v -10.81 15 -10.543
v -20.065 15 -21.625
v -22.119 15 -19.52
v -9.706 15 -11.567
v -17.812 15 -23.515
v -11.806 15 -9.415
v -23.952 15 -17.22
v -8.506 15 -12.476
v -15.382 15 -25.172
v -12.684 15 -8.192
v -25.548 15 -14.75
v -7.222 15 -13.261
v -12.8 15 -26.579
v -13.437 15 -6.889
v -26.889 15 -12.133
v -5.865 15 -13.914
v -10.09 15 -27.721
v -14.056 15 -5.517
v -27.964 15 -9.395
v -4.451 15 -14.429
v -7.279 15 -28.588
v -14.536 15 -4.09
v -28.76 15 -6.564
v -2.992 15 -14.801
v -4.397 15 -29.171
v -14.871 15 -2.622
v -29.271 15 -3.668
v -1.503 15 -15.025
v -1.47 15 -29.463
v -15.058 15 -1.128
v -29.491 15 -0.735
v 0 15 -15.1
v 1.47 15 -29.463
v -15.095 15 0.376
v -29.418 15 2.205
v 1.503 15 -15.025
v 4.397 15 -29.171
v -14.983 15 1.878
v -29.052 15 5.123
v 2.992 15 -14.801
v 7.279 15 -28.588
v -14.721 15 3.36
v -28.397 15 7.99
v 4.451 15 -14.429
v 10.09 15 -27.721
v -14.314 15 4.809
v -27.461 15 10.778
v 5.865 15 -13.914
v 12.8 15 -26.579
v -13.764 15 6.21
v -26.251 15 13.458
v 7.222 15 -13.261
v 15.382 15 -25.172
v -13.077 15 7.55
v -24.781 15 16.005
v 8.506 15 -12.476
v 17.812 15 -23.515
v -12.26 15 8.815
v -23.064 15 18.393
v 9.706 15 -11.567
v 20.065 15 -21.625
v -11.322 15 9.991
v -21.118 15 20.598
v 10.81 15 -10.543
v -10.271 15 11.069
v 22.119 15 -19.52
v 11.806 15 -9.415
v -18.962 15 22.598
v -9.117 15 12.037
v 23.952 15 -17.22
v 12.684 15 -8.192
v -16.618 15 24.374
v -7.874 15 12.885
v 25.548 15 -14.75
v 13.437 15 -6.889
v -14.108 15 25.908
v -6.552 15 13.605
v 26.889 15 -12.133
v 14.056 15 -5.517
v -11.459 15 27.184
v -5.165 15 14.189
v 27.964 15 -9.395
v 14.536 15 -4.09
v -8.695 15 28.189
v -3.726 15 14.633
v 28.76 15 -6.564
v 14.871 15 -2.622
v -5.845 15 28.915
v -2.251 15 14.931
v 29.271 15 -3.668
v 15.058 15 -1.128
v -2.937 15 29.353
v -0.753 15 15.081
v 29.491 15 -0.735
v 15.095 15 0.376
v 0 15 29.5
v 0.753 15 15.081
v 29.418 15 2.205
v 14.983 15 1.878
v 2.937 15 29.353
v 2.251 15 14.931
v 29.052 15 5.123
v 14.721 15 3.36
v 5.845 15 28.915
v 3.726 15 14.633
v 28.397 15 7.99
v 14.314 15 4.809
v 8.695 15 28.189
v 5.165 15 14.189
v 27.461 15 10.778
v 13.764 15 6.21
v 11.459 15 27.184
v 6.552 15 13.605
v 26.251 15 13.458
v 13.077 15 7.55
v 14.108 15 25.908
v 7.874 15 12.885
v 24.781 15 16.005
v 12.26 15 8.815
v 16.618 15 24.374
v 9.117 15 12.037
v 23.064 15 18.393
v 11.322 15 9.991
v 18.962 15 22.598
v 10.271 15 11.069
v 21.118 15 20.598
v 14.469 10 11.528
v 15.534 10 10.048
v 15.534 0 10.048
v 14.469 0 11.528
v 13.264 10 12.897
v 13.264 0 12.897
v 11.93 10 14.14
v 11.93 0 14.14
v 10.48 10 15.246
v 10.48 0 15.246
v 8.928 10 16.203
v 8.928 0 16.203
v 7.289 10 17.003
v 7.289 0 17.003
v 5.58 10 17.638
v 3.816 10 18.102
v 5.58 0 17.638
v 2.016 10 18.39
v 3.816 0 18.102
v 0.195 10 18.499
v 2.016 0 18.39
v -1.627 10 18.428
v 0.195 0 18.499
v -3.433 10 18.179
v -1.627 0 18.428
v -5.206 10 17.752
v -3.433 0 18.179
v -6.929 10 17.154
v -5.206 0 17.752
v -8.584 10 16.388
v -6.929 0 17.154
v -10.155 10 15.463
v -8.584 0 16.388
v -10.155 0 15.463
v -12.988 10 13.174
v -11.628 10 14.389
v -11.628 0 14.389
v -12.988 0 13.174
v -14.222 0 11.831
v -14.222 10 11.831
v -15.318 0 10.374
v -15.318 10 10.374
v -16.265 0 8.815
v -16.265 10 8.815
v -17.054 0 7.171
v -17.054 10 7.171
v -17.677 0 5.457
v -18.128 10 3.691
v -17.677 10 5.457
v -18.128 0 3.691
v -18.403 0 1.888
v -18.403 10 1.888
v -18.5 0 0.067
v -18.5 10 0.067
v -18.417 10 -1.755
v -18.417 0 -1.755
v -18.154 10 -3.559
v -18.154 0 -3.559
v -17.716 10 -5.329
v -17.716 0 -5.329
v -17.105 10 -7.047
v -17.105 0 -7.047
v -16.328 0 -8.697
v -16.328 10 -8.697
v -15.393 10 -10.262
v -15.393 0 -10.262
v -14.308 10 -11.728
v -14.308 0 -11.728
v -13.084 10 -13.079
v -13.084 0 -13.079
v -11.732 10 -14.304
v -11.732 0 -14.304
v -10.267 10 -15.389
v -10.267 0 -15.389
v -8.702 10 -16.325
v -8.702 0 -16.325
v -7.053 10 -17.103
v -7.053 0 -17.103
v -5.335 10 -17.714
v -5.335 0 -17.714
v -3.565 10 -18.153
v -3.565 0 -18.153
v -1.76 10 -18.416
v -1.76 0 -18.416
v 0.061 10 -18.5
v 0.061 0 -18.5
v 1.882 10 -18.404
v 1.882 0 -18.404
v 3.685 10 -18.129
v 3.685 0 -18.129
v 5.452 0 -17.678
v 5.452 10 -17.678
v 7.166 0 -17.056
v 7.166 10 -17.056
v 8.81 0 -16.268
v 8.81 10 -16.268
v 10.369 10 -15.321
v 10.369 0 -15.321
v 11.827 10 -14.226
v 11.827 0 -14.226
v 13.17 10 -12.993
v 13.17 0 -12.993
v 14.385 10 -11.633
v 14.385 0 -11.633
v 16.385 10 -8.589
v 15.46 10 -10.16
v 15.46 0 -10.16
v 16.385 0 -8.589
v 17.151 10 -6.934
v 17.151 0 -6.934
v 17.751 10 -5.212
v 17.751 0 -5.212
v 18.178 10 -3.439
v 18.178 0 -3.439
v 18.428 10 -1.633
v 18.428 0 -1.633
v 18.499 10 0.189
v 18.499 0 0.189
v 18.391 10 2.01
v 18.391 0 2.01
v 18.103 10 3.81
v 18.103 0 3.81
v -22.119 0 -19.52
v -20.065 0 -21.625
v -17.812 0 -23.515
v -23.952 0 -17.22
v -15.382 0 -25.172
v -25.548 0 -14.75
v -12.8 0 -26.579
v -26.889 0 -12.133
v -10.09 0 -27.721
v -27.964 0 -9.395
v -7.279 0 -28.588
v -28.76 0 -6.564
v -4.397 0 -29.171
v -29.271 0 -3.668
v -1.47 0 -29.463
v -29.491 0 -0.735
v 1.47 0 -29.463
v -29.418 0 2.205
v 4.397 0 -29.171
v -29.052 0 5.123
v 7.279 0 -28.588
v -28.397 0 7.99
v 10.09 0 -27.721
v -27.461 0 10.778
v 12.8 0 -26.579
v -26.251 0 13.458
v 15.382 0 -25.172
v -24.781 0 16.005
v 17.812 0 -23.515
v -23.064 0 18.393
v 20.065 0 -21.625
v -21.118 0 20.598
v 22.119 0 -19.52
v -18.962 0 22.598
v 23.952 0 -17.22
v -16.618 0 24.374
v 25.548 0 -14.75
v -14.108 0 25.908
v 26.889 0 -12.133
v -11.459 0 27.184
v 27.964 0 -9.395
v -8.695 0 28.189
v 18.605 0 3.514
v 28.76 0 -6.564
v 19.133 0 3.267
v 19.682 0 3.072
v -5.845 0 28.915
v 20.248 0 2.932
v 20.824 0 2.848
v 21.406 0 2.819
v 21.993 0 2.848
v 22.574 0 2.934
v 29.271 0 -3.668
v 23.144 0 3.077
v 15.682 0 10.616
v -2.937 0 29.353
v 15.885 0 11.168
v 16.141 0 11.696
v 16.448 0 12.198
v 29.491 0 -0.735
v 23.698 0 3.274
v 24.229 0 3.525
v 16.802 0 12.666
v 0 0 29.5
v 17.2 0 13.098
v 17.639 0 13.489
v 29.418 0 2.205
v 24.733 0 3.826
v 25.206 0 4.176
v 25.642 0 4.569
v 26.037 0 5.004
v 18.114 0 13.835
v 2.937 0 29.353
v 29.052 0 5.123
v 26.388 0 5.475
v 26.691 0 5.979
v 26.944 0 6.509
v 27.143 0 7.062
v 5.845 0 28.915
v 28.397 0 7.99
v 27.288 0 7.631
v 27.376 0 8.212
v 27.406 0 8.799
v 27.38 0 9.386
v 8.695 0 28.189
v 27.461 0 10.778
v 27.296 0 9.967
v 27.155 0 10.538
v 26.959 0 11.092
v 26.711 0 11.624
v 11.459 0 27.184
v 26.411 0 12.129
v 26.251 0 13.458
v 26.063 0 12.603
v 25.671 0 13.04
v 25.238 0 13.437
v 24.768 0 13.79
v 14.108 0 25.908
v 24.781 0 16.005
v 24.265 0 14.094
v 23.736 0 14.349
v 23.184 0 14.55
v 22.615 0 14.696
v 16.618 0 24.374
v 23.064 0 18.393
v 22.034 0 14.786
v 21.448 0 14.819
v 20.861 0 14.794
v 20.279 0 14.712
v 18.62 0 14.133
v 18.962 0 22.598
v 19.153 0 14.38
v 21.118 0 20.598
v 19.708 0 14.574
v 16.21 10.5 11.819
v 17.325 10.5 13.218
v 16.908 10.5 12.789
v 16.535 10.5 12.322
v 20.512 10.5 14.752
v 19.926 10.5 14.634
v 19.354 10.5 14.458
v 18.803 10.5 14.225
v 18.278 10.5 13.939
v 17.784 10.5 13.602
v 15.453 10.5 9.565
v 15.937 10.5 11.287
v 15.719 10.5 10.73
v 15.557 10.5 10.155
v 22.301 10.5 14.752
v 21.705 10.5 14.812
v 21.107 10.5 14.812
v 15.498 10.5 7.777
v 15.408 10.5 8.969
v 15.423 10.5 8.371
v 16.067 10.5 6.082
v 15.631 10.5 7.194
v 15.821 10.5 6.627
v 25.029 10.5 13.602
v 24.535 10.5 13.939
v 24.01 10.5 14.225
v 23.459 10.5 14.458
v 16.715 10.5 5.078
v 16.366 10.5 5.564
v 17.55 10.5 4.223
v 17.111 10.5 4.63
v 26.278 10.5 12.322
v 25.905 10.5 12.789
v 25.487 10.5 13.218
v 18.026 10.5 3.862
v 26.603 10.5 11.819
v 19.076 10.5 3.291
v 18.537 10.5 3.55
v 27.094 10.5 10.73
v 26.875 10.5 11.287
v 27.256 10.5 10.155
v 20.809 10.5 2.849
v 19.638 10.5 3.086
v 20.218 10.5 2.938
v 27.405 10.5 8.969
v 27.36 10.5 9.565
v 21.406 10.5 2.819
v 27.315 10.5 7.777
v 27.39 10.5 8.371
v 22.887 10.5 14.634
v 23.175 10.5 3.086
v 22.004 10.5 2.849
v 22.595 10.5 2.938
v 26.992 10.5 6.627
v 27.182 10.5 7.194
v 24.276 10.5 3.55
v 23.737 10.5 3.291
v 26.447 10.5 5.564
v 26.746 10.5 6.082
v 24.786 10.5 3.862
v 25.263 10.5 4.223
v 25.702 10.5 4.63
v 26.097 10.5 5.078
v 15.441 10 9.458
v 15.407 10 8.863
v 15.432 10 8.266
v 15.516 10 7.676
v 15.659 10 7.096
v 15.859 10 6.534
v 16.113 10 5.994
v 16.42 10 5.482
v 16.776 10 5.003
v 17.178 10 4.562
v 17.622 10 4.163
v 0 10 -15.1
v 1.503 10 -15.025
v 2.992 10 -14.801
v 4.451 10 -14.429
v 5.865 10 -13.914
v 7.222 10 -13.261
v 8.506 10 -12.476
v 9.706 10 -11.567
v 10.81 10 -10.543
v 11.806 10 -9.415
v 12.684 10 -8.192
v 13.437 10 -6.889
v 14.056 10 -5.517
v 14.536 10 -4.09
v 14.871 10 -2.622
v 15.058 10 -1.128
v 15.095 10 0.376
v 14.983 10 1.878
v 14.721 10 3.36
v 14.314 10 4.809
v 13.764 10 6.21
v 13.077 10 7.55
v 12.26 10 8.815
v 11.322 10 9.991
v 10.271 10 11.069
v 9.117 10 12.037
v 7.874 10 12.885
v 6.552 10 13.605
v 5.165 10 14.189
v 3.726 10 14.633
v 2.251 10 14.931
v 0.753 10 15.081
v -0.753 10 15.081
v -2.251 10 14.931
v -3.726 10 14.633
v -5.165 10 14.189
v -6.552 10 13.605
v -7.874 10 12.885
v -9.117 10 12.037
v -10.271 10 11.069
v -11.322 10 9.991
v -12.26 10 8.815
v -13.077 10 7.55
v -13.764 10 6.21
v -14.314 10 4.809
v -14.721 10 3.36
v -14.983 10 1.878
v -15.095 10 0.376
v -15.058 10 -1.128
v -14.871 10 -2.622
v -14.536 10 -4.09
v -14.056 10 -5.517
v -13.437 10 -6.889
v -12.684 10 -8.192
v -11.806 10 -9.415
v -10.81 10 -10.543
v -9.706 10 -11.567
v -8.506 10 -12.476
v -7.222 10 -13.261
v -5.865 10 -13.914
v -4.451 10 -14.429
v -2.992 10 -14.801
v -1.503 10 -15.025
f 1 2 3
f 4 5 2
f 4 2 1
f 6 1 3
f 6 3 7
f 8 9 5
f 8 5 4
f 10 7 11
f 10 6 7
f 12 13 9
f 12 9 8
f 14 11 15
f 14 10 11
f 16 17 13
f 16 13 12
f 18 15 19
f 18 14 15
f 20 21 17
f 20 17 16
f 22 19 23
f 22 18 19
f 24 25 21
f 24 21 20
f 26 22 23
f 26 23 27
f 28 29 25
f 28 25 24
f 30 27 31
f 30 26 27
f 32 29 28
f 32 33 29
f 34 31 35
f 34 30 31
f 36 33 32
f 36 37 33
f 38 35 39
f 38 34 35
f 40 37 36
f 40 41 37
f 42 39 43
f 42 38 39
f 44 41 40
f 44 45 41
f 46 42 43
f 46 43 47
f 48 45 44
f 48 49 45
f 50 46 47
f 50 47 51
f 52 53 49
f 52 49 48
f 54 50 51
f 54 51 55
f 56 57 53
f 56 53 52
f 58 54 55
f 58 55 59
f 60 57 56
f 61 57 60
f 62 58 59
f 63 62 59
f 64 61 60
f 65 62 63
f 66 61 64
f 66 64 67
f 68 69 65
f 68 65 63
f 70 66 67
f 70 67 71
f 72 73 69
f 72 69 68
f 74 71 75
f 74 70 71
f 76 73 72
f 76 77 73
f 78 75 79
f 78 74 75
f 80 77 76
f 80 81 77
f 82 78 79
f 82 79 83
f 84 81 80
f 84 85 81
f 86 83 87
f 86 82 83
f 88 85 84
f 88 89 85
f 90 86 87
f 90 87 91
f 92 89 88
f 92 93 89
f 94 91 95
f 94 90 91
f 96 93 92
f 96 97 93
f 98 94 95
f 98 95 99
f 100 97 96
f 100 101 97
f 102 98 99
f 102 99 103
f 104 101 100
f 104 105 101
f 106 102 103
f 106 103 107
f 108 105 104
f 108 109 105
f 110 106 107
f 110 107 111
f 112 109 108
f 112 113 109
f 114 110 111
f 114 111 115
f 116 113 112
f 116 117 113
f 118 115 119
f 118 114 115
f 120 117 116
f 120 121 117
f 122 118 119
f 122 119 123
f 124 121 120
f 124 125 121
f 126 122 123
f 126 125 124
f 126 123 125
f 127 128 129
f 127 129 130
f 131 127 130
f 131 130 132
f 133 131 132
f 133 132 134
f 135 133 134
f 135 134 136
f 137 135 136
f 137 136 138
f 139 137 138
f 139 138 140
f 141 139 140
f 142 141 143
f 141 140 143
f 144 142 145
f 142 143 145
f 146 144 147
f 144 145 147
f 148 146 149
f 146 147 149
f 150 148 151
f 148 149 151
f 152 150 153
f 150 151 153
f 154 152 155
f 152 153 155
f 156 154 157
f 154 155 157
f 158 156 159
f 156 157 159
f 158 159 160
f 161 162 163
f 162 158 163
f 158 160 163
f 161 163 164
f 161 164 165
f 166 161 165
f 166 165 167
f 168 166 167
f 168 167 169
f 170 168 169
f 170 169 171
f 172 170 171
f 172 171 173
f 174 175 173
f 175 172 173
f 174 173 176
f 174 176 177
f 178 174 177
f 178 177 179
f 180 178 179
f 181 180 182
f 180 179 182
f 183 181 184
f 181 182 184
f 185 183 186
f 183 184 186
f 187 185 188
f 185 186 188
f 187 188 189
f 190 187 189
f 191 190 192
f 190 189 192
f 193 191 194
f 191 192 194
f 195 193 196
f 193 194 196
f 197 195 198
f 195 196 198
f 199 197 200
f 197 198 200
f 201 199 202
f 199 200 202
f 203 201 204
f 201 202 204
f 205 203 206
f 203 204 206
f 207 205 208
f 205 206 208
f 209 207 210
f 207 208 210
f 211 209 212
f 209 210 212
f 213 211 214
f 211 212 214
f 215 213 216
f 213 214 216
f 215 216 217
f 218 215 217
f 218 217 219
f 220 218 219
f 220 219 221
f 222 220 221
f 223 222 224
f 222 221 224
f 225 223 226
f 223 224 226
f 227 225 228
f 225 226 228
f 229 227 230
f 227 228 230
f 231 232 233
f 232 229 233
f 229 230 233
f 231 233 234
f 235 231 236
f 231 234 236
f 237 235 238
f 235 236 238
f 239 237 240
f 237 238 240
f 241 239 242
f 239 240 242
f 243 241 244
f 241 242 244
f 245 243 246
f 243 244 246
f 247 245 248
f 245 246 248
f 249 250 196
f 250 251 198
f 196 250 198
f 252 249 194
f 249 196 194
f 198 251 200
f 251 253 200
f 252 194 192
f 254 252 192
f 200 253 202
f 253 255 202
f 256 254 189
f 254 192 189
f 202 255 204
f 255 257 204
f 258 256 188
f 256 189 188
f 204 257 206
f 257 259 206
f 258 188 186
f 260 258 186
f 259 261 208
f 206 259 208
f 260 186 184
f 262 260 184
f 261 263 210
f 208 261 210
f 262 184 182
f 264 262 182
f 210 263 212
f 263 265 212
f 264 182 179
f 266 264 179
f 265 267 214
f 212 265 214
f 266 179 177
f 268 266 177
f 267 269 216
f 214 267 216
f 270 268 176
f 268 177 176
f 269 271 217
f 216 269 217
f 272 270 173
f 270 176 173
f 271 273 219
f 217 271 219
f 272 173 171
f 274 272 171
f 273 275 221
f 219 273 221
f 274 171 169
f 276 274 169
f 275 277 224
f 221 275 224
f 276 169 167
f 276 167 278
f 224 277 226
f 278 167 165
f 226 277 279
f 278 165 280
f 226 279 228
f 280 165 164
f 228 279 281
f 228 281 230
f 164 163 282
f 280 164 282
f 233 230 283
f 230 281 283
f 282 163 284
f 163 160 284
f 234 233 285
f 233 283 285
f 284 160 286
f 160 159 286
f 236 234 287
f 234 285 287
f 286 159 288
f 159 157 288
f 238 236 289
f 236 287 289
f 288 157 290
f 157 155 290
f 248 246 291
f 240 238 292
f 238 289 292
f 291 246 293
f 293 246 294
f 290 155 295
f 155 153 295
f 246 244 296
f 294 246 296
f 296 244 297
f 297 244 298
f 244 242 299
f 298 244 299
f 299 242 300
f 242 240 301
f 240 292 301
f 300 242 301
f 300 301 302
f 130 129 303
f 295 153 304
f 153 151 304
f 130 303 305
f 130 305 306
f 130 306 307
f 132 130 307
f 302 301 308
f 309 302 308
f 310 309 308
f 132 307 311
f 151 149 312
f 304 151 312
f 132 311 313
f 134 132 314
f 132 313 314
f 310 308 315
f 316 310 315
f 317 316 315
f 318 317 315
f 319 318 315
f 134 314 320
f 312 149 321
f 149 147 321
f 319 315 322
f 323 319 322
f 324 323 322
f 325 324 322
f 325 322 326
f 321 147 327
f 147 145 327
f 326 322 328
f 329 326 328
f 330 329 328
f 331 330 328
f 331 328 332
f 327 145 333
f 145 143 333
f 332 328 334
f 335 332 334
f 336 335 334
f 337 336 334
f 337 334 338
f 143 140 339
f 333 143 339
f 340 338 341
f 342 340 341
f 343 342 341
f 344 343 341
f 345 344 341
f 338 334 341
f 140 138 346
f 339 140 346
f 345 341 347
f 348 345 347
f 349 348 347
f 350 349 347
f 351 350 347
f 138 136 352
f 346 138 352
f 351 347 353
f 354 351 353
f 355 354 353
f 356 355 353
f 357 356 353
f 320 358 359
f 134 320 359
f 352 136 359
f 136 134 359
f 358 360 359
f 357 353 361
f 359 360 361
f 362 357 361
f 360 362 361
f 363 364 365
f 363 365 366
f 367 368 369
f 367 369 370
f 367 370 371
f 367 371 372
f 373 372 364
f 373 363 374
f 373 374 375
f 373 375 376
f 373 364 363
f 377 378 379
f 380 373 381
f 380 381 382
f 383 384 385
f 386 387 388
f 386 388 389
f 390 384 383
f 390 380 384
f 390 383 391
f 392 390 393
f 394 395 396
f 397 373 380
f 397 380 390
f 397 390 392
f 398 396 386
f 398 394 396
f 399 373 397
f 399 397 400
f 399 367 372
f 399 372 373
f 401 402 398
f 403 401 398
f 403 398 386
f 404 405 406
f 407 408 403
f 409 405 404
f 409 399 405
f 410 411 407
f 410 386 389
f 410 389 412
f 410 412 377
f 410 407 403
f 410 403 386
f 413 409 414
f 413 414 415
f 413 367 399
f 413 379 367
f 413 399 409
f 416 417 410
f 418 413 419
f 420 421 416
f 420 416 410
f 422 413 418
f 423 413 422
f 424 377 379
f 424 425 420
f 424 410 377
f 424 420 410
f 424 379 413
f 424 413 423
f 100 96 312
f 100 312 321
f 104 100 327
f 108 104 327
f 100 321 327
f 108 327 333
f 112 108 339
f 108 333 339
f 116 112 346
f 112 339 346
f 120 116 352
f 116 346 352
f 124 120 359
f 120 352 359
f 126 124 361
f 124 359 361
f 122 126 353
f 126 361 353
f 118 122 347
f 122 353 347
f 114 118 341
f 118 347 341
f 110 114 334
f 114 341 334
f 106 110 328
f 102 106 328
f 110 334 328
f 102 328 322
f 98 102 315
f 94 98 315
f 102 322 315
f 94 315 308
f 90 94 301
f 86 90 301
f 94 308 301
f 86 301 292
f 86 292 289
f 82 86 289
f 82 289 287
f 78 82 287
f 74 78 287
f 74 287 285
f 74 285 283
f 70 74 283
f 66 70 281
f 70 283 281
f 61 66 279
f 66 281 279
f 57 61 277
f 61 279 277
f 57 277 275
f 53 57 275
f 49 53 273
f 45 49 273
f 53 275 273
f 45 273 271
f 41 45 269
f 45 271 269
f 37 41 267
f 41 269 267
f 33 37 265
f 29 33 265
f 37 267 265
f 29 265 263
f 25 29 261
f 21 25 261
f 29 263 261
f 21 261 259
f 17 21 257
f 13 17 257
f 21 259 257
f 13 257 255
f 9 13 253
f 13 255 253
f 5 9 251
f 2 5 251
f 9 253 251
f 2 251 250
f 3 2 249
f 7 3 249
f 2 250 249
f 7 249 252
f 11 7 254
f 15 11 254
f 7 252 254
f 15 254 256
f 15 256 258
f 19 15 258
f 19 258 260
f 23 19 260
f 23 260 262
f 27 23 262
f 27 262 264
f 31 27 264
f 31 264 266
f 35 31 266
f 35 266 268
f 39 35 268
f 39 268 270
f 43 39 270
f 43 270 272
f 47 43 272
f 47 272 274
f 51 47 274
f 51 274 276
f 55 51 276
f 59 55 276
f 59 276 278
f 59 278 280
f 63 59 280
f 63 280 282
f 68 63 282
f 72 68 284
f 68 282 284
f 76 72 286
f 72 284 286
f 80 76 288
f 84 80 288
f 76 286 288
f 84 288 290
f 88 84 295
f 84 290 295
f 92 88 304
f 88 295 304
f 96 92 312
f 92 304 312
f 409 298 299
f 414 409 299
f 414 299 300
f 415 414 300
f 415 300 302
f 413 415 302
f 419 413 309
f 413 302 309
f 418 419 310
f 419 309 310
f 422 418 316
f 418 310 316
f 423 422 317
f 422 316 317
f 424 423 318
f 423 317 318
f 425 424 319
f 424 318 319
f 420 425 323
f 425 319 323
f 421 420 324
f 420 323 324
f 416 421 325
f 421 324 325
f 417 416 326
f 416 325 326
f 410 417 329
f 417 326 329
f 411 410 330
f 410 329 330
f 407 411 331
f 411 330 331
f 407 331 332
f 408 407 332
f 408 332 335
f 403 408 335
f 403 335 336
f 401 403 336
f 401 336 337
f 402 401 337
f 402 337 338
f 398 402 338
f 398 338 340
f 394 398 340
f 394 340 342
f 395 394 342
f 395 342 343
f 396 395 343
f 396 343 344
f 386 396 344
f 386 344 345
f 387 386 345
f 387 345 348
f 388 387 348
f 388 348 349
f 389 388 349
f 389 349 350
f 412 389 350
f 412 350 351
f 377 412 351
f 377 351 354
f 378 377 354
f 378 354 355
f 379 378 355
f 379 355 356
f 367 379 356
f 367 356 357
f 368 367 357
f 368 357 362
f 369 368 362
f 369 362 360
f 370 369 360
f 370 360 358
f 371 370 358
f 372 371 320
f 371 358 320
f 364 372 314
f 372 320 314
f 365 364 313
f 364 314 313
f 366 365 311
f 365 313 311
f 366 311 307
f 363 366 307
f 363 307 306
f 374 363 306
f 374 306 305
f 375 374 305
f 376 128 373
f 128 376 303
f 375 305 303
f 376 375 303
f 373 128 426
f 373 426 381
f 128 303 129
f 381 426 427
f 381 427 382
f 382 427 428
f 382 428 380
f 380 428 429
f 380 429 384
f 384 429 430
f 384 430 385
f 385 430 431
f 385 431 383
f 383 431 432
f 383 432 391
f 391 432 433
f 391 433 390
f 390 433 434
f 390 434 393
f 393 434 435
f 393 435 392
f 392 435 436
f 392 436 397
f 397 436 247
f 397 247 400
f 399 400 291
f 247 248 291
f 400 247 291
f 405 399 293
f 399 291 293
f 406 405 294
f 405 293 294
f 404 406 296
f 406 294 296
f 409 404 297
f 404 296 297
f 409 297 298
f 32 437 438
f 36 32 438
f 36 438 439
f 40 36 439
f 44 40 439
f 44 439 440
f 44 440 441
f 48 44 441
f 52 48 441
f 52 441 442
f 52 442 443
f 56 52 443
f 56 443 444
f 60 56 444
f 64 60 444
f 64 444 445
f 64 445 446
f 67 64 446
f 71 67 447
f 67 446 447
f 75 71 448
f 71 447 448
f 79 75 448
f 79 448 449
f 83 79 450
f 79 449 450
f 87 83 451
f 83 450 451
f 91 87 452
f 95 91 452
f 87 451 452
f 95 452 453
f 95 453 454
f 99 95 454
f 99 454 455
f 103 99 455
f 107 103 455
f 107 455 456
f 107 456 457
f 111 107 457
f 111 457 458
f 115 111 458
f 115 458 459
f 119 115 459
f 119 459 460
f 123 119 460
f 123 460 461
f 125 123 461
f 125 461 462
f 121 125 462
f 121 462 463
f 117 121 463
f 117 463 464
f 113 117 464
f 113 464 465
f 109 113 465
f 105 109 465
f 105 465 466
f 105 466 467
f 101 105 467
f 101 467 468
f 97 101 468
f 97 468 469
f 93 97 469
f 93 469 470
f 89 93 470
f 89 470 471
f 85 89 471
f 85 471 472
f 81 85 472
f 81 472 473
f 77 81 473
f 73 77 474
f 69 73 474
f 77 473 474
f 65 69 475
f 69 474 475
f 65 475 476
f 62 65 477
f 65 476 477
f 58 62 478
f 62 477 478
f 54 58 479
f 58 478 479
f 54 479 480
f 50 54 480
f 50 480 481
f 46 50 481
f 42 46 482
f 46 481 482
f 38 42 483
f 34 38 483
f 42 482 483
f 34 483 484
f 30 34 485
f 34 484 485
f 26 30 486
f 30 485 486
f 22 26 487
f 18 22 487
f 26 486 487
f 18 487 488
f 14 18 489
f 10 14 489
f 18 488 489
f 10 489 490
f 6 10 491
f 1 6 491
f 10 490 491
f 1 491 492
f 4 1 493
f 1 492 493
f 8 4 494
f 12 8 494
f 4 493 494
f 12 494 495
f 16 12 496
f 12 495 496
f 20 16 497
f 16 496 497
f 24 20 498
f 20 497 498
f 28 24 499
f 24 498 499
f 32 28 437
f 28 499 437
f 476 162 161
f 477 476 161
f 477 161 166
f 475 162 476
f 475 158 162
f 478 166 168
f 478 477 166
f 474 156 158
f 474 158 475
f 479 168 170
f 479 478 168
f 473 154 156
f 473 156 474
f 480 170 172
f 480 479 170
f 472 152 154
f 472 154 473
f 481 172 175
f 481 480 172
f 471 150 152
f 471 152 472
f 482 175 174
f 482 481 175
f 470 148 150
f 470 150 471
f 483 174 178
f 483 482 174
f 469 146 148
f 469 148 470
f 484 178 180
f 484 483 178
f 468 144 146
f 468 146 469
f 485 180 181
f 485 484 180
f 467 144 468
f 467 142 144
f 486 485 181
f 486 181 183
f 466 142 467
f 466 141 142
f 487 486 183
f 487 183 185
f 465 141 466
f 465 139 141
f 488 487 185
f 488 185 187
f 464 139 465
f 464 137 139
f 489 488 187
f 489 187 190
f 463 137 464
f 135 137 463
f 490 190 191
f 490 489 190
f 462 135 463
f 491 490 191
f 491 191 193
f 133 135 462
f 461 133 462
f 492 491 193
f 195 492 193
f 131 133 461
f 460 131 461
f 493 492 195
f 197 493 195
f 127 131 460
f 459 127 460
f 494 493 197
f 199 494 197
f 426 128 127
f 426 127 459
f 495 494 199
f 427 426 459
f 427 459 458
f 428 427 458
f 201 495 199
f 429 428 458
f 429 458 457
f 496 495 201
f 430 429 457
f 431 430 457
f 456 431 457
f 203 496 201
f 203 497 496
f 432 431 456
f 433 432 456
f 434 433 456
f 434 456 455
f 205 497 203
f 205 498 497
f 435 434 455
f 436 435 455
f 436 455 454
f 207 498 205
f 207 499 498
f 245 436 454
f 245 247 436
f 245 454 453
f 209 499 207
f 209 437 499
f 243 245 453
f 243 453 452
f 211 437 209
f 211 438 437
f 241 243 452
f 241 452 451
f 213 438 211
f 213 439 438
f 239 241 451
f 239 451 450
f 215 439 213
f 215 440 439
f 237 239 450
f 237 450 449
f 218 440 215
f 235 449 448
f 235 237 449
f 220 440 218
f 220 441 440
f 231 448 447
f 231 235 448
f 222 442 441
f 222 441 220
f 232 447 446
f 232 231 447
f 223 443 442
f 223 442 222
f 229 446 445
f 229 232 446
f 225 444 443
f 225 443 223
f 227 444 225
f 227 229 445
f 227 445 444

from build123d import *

# Parameters (mm, degrees)
SKETCH1_R           = 29.5
BOSS_EXTRUDE1_DEPTH = 15
SKETCH2_R           = 15.1
CUT_EXTRUDE1_DEPTH  = 45.333959895
SKETCH3_R           = 18.5
CUT_EXTRUDE2_DEPTH  = 10
SKETCH4_R           = 6
CUT_EXTRUDE3_DEPTH  = 10.5


with BuildPart() as part:
    # Sketch1 → Boss-Extrude1 (new body)
    with BuildSketch(Plane(origin=(0, 0, 0), x_dir=(1, 0, 0), z_dir=(0, 1, 0))):
        with Locations(Location((0, 0, 0), (0, 0, 270))):
            Circle(SKETCH1_R)
    extrude(amount=BOSS_EXTRUDE1_DEPTH)

    # Sketch2 → Cut-Extrude1 (cut, through all)
    with BuildSketch(Plane.XZ):
        with Locations(Location((0, 0, 0), (0, 0, 270))):
            Circle(SKETCH2_R)
    extrude(amount=-CUT_EXTRUDE1_DEPTH, mode=Mode.SUBTRACT)

    # Sketch3 → Cut-Extrude2 (cut)
    with BuildSketch(Plane.XZ):
        with Locations(Location((0, 0, 0), (0, 0, 270))):
            Circle(SKETCH3_R)
    extrude(amount=-CUT_EXTRUDE2_DEPTH, mode=Mode.SUBTRACT)

    # Sketch4 → Cut-Extrude3 (cut)
    with BuildSketch(Plane.XZ):
        with Locations(Location((21.406403657, 8.819380288, 0), (0, 0, 270))):
            Circle(SKETCH4_R)
    extrude(amount=-CUT_EXTRUDE3_DEPTH, mode=Mode.SUBTRACT)


solid = part.part
